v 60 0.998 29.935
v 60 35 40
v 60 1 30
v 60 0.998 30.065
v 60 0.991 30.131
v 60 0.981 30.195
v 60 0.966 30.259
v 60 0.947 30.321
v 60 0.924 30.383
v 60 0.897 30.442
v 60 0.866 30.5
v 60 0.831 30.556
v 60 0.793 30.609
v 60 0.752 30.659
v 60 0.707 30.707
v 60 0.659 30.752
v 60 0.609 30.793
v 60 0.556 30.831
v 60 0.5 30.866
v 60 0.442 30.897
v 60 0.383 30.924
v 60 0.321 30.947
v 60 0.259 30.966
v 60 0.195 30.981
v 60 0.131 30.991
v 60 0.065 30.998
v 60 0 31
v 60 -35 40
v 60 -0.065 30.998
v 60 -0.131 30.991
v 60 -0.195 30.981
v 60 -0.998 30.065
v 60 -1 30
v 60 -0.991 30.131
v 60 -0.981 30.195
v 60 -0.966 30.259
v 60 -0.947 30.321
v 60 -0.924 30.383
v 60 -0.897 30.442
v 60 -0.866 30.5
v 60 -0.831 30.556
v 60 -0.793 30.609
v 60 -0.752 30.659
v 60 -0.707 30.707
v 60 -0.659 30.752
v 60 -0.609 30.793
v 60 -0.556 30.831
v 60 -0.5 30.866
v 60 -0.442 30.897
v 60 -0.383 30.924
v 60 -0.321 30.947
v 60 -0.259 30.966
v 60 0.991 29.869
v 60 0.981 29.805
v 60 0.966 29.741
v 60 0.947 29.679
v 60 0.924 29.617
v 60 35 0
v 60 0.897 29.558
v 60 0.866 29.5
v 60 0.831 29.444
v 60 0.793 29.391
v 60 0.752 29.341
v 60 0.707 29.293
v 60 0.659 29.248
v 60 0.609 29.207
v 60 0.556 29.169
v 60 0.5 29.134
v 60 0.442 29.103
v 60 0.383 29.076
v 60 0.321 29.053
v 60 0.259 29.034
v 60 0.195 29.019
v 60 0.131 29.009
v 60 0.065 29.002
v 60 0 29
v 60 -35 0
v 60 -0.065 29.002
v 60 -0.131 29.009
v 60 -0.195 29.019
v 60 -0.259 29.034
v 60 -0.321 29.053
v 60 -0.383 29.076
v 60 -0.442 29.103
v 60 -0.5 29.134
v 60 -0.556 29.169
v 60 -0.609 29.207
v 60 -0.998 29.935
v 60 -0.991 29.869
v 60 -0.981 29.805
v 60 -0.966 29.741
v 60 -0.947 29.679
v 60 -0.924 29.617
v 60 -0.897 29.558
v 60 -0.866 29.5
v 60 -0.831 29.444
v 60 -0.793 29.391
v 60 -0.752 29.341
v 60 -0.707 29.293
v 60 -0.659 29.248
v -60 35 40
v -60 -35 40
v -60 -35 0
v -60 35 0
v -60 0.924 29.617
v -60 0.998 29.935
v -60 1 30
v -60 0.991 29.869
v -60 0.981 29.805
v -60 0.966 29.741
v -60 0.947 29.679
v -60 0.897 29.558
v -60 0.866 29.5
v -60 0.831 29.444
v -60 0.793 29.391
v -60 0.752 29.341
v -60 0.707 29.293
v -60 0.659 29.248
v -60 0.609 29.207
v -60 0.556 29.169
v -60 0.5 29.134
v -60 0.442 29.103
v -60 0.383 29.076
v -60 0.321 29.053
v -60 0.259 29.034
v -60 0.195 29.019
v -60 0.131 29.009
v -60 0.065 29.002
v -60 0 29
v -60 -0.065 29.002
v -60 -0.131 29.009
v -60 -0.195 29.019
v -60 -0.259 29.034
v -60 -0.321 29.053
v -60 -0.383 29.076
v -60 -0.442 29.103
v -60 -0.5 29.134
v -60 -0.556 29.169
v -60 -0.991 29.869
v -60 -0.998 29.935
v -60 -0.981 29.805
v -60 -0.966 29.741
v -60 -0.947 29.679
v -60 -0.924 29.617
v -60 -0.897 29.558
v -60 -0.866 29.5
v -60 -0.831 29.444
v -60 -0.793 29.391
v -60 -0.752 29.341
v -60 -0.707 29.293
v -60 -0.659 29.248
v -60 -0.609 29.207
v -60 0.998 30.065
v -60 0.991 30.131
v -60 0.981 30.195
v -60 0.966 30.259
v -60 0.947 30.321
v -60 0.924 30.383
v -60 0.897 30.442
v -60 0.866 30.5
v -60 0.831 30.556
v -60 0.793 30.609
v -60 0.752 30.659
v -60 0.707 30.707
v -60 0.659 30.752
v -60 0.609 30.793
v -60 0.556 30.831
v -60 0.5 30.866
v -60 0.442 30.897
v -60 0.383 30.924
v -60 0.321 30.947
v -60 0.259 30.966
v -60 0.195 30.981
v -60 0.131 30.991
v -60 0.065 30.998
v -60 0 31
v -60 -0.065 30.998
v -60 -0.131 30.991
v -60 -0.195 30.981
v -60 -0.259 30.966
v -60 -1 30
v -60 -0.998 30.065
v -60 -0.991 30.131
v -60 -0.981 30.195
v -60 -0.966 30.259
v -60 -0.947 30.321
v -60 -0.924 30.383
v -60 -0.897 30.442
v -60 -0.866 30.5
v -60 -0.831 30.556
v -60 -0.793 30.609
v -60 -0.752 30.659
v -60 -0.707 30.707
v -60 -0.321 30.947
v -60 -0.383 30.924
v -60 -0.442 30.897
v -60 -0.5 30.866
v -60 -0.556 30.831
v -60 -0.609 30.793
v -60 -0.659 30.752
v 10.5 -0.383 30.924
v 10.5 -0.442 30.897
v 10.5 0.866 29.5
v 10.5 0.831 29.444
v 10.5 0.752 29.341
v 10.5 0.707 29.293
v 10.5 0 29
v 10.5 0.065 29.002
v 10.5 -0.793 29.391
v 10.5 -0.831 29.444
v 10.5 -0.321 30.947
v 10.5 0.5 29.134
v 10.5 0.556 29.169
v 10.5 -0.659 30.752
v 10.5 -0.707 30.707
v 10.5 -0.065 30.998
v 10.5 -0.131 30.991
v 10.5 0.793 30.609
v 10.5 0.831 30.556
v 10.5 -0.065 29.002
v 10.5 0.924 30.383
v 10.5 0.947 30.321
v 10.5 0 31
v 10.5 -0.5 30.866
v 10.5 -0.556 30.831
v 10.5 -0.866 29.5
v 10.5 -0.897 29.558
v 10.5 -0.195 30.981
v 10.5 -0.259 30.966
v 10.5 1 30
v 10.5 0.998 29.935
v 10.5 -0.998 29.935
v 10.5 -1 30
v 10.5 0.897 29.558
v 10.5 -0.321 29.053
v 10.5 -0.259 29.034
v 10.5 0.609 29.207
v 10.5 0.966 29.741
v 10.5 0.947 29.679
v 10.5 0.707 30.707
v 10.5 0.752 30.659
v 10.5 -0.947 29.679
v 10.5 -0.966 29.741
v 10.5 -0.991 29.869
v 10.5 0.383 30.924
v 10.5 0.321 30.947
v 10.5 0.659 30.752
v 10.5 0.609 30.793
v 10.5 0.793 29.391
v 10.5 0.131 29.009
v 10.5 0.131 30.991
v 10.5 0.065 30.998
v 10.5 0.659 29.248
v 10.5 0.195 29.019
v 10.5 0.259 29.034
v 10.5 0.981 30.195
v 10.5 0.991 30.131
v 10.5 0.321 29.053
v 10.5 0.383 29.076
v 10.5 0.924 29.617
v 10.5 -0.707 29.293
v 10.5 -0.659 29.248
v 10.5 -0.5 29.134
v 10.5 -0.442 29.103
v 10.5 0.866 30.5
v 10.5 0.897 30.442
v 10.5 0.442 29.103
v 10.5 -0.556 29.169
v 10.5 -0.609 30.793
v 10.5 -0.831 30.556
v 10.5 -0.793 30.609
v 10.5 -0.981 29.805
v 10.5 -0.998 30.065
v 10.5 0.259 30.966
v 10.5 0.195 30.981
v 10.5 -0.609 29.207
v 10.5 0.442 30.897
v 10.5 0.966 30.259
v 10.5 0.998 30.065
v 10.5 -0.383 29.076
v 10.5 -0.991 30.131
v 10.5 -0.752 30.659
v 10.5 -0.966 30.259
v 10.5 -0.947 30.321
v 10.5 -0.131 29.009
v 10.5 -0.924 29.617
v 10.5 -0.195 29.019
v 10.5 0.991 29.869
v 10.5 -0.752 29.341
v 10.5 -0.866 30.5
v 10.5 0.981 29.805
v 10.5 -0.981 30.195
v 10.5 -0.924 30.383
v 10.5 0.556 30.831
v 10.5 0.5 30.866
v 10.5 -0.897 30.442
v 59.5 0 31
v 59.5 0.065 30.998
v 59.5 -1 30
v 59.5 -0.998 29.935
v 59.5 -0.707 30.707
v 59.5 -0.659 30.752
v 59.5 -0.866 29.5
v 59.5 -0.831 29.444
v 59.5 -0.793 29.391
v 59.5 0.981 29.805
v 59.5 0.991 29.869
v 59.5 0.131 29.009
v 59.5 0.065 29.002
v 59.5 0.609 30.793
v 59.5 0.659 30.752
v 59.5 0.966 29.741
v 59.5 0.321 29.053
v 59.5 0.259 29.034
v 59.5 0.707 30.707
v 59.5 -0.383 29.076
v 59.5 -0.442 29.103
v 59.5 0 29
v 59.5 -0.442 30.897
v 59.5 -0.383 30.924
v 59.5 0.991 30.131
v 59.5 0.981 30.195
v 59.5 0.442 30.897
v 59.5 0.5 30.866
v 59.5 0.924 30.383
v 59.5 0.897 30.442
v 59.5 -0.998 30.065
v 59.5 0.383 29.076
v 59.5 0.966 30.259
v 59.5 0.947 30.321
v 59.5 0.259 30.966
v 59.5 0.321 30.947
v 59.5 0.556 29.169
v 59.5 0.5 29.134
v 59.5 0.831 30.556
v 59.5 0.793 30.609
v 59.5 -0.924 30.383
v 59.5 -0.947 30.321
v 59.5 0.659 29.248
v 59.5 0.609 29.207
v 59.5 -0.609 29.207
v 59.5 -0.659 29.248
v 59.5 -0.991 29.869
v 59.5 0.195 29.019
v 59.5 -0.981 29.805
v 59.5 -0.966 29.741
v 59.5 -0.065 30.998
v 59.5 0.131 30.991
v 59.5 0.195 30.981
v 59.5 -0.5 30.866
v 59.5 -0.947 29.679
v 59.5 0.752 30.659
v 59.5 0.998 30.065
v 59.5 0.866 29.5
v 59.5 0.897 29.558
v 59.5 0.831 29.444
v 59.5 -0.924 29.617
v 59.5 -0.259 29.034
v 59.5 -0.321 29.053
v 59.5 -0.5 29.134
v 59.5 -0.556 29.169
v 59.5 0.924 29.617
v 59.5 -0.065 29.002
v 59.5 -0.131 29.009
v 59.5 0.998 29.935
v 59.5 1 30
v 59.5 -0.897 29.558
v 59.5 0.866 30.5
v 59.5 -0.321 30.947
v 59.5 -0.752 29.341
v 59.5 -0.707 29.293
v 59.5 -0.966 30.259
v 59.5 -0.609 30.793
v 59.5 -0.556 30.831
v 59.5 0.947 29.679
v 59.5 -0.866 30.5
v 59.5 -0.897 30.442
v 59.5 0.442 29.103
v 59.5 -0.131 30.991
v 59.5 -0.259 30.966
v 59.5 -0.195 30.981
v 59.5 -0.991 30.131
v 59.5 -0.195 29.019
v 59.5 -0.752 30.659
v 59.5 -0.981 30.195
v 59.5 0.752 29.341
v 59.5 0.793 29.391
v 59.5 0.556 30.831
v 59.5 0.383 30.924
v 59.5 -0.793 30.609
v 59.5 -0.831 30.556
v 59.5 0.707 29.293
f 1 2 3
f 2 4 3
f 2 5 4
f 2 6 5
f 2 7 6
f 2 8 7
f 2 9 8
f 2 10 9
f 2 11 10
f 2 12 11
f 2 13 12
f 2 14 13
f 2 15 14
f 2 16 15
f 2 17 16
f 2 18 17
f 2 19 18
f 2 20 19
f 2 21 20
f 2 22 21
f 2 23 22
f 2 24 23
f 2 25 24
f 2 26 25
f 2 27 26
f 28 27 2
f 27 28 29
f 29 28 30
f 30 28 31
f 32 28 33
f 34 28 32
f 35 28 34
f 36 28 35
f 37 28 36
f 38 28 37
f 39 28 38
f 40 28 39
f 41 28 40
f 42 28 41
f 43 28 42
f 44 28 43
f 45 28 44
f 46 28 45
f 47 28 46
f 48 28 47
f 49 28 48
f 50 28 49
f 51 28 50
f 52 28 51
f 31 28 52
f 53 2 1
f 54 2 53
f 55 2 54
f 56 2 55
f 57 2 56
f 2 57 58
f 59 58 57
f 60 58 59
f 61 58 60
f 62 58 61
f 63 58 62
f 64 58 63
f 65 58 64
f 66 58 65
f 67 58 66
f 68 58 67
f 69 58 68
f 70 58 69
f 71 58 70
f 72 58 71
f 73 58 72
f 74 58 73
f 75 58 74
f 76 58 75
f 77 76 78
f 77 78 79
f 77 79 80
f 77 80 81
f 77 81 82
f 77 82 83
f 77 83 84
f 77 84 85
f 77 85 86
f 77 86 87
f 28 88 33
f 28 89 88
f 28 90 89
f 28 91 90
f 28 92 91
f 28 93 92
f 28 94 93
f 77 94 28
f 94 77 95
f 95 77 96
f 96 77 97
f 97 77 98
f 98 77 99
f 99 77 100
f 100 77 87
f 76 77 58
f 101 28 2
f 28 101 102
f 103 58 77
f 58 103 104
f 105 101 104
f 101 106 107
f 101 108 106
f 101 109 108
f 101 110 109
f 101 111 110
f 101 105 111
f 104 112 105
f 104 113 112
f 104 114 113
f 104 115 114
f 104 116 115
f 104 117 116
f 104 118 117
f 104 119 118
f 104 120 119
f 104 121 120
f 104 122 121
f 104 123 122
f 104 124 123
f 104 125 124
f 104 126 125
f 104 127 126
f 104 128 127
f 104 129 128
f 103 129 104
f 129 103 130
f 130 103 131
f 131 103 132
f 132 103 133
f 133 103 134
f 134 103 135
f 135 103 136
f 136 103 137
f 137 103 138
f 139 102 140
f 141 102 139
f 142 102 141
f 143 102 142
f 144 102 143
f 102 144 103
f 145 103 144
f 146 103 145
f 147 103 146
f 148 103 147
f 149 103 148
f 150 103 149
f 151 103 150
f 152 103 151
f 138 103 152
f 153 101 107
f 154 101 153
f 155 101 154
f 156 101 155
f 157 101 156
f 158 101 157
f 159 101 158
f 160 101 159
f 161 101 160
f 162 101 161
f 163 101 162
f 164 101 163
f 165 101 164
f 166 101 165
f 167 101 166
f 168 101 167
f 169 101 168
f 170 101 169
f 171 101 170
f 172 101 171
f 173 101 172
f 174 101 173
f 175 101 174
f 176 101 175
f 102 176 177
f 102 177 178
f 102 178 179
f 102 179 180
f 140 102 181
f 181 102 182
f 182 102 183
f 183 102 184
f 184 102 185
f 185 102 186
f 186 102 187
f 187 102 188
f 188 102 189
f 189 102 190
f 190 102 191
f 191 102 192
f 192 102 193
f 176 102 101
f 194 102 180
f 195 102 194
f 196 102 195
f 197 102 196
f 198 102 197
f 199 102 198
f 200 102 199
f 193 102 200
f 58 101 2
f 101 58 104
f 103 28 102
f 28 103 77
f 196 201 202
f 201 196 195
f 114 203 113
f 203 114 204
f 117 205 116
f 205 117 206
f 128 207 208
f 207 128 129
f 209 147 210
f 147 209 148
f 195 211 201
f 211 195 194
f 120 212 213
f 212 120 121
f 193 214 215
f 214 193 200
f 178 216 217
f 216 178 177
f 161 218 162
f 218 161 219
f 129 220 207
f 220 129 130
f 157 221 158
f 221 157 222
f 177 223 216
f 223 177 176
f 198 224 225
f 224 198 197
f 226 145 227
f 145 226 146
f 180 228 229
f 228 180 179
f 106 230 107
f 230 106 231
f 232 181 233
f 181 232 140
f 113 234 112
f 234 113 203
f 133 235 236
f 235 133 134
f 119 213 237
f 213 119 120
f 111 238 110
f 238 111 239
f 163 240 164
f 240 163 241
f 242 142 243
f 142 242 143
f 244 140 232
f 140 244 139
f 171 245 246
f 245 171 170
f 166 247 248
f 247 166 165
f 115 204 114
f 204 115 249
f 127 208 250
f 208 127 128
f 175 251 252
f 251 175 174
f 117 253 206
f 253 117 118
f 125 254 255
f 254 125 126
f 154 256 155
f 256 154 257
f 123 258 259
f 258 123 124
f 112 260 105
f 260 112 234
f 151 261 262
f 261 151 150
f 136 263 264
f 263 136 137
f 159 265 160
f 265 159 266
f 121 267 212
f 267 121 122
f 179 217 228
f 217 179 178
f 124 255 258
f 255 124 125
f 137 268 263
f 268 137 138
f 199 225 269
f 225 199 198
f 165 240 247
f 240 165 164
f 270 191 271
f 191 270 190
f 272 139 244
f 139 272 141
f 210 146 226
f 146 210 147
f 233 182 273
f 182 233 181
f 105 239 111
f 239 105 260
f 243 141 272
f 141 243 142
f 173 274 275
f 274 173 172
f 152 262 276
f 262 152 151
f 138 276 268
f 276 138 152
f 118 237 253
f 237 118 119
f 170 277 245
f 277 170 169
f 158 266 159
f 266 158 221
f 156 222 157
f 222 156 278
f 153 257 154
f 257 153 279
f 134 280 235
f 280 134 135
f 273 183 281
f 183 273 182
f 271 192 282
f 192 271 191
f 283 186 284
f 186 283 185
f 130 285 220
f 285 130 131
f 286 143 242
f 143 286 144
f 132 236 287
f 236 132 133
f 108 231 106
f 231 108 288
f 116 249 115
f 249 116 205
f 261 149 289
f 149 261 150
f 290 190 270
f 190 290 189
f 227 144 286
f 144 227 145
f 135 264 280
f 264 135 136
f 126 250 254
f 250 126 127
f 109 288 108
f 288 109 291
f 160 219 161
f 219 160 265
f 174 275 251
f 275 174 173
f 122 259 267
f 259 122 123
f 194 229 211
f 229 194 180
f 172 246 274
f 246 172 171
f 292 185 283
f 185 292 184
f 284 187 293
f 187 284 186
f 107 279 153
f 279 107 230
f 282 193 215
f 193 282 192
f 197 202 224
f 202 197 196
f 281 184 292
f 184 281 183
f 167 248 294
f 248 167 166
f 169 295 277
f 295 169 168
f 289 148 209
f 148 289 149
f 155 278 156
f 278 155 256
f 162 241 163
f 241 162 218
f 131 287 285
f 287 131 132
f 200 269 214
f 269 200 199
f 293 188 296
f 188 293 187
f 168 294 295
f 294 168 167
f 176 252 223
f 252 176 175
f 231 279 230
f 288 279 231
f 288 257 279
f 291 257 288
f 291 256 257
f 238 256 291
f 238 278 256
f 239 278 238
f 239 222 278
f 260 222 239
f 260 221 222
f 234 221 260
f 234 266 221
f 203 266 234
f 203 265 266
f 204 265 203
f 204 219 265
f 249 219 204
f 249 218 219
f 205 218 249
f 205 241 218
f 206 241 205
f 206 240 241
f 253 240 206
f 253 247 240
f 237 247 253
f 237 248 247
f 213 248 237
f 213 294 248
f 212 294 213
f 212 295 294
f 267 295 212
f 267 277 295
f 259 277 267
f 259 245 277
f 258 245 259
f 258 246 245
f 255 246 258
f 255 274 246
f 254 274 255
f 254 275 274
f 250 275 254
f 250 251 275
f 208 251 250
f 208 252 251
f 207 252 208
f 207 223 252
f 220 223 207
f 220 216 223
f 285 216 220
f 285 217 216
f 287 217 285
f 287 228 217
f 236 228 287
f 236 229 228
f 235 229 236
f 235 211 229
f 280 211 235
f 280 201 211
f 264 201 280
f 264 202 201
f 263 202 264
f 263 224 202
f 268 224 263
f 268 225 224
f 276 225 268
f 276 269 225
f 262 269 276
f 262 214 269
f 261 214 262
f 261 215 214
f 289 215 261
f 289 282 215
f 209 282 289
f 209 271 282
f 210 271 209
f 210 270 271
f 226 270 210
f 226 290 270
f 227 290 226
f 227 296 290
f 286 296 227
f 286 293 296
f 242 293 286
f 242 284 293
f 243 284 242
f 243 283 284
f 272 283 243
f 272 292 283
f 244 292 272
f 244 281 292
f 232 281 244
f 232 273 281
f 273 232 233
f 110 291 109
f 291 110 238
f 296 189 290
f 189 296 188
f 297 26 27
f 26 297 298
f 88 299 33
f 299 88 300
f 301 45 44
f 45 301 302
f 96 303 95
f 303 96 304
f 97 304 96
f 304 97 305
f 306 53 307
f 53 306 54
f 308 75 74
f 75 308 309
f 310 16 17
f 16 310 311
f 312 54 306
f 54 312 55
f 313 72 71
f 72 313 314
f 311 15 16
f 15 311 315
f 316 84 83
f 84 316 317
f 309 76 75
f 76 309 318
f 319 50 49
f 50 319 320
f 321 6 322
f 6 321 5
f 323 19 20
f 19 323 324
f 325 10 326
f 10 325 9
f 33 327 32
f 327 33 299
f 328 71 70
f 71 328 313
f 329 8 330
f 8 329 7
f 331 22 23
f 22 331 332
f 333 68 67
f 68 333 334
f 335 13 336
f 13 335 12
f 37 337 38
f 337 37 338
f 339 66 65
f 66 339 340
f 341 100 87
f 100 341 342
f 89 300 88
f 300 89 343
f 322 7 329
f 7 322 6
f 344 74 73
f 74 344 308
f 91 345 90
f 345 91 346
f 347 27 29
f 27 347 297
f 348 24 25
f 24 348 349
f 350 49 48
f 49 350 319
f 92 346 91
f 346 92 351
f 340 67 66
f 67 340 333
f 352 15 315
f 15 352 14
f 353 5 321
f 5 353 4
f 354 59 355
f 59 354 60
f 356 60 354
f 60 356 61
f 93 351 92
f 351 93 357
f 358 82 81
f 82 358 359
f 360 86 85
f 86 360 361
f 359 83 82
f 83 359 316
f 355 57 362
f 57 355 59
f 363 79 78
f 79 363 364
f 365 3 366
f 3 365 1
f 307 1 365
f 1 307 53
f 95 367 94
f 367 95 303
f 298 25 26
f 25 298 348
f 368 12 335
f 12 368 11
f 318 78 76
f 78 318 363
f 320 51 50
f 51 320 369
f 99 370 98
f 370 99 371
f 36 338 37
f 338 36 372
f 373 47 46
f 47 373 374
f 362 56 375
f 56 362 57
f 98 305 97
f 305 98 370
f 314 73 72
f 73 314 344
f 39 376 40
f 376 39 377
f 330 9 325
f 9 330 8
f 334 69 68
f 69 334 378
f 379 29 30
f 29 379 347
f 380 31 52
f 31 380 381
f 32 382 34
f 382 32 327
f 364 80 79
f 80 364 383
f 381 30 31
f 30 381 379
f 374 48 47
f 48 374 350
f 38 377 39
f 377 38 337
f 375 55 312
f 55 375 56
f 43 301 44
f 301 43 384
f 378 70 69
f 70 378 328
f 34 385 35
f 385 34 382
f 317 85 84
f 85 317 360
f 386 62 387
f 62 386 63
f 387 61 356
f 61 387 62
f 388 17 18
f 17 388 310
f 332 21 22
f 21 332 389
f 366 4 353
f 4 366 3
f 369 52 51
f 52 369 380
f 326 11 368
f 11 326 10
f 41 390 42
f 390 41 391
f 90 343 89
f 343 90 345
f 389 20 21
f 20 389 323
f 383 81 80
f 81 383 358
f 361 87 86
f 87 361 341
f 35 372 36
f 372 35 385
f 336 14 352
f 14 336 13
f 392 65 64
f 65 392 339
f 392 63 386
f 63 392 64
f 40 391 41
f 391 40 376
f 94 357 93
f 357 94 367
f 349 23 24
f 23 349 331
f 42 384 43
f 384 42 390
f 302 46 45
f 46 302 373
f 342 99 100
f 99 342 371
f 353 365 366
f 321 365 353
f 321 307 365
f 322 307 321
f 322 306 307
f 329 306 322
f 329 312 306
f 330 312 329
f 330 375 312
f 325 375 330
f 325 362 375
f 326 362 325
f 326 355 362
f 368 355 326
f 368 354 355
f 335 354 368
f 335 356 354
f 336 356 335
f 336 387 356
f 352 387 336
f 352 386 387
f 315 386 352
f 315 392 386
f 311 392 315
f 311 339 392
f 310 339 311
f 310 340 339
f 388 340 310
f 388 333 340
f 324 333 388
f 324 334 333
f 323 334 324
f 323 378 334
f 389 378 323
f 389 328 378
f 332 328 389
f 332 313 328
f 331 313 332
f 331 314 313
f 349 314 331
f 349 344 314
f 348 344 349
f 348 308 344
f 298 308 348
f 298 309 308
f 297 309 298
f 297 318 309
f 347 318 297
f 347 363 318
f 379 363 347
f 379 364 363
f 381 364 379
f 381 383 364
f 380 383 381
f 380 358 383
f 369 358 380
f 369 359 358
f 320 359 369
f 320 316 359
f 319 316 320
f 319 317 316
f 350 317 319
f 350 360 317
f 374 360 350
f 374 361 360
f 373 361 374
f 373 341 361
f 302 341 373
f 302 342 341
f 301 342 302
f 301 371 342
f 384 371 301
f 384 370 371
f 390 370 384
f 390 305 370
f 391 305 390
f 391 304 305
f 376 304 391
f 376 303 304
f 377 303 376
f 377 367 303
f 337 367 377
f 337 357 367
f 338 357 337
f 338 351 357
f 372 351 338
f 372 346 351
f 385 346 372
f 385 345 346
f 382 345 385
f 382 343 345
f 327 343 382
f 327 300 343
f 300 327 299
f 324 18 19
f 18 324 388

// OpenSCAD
// Mini horizontal gel-electrophoresis buffer tank
// Print orientation: base on XY plane, open top, builds up +Z

// ---- Tank dimensions ----
outer_x = 120;   // outer length along X
outer_y = 70;    // outer width along Y
height  = 40;    // outer height along Z
wall    = 3;     // wall thickness
floor   = 3;     // floor thickness

// ---- Platform dimensions ----
plat_len   = 60;  // platform length along X (centred)
plat_top_z = 13;  // platform top height above inner floor

// ---- Electrode holes ----
hole_d = 2;       // hole diameter
hole_y = 0;       // hole Y position
hole_z = 30;      // hole Z position

// ---- Modelling helpers ----
eps = 0.5;        // cutter overshoot past faces
$fn = 96;         // curve resolution

// ---- Derived ----
inner_h = height - floor;  // inner floor to open top
overlap = min(wall, floor) - 0.01;  // wall/floor overlap for clean union

difference() {
    union() {
        // Main tank body
        translate([-outer_x/2, -outer_y/2, 0])
            cube([outer_x, outer_y, height]);

        // Raised platform in the middle
        translate([-plat_len/2, -outer_y/2, floor - overlap])
            cube([plat_len, outer_y, plat_top_z + wall]);
    }

    // Electrode holes through each end wall, along X
    for (sx = [-1, 1])
        translate([sx > 0 ? outer_x/2 - eps : -outer_x/2 - eps,
                   hole_y, hole_z])
            rotate([0, 90, 0])
                cylinder(d = hole_d, h = outer_y + 2*eps);
}
